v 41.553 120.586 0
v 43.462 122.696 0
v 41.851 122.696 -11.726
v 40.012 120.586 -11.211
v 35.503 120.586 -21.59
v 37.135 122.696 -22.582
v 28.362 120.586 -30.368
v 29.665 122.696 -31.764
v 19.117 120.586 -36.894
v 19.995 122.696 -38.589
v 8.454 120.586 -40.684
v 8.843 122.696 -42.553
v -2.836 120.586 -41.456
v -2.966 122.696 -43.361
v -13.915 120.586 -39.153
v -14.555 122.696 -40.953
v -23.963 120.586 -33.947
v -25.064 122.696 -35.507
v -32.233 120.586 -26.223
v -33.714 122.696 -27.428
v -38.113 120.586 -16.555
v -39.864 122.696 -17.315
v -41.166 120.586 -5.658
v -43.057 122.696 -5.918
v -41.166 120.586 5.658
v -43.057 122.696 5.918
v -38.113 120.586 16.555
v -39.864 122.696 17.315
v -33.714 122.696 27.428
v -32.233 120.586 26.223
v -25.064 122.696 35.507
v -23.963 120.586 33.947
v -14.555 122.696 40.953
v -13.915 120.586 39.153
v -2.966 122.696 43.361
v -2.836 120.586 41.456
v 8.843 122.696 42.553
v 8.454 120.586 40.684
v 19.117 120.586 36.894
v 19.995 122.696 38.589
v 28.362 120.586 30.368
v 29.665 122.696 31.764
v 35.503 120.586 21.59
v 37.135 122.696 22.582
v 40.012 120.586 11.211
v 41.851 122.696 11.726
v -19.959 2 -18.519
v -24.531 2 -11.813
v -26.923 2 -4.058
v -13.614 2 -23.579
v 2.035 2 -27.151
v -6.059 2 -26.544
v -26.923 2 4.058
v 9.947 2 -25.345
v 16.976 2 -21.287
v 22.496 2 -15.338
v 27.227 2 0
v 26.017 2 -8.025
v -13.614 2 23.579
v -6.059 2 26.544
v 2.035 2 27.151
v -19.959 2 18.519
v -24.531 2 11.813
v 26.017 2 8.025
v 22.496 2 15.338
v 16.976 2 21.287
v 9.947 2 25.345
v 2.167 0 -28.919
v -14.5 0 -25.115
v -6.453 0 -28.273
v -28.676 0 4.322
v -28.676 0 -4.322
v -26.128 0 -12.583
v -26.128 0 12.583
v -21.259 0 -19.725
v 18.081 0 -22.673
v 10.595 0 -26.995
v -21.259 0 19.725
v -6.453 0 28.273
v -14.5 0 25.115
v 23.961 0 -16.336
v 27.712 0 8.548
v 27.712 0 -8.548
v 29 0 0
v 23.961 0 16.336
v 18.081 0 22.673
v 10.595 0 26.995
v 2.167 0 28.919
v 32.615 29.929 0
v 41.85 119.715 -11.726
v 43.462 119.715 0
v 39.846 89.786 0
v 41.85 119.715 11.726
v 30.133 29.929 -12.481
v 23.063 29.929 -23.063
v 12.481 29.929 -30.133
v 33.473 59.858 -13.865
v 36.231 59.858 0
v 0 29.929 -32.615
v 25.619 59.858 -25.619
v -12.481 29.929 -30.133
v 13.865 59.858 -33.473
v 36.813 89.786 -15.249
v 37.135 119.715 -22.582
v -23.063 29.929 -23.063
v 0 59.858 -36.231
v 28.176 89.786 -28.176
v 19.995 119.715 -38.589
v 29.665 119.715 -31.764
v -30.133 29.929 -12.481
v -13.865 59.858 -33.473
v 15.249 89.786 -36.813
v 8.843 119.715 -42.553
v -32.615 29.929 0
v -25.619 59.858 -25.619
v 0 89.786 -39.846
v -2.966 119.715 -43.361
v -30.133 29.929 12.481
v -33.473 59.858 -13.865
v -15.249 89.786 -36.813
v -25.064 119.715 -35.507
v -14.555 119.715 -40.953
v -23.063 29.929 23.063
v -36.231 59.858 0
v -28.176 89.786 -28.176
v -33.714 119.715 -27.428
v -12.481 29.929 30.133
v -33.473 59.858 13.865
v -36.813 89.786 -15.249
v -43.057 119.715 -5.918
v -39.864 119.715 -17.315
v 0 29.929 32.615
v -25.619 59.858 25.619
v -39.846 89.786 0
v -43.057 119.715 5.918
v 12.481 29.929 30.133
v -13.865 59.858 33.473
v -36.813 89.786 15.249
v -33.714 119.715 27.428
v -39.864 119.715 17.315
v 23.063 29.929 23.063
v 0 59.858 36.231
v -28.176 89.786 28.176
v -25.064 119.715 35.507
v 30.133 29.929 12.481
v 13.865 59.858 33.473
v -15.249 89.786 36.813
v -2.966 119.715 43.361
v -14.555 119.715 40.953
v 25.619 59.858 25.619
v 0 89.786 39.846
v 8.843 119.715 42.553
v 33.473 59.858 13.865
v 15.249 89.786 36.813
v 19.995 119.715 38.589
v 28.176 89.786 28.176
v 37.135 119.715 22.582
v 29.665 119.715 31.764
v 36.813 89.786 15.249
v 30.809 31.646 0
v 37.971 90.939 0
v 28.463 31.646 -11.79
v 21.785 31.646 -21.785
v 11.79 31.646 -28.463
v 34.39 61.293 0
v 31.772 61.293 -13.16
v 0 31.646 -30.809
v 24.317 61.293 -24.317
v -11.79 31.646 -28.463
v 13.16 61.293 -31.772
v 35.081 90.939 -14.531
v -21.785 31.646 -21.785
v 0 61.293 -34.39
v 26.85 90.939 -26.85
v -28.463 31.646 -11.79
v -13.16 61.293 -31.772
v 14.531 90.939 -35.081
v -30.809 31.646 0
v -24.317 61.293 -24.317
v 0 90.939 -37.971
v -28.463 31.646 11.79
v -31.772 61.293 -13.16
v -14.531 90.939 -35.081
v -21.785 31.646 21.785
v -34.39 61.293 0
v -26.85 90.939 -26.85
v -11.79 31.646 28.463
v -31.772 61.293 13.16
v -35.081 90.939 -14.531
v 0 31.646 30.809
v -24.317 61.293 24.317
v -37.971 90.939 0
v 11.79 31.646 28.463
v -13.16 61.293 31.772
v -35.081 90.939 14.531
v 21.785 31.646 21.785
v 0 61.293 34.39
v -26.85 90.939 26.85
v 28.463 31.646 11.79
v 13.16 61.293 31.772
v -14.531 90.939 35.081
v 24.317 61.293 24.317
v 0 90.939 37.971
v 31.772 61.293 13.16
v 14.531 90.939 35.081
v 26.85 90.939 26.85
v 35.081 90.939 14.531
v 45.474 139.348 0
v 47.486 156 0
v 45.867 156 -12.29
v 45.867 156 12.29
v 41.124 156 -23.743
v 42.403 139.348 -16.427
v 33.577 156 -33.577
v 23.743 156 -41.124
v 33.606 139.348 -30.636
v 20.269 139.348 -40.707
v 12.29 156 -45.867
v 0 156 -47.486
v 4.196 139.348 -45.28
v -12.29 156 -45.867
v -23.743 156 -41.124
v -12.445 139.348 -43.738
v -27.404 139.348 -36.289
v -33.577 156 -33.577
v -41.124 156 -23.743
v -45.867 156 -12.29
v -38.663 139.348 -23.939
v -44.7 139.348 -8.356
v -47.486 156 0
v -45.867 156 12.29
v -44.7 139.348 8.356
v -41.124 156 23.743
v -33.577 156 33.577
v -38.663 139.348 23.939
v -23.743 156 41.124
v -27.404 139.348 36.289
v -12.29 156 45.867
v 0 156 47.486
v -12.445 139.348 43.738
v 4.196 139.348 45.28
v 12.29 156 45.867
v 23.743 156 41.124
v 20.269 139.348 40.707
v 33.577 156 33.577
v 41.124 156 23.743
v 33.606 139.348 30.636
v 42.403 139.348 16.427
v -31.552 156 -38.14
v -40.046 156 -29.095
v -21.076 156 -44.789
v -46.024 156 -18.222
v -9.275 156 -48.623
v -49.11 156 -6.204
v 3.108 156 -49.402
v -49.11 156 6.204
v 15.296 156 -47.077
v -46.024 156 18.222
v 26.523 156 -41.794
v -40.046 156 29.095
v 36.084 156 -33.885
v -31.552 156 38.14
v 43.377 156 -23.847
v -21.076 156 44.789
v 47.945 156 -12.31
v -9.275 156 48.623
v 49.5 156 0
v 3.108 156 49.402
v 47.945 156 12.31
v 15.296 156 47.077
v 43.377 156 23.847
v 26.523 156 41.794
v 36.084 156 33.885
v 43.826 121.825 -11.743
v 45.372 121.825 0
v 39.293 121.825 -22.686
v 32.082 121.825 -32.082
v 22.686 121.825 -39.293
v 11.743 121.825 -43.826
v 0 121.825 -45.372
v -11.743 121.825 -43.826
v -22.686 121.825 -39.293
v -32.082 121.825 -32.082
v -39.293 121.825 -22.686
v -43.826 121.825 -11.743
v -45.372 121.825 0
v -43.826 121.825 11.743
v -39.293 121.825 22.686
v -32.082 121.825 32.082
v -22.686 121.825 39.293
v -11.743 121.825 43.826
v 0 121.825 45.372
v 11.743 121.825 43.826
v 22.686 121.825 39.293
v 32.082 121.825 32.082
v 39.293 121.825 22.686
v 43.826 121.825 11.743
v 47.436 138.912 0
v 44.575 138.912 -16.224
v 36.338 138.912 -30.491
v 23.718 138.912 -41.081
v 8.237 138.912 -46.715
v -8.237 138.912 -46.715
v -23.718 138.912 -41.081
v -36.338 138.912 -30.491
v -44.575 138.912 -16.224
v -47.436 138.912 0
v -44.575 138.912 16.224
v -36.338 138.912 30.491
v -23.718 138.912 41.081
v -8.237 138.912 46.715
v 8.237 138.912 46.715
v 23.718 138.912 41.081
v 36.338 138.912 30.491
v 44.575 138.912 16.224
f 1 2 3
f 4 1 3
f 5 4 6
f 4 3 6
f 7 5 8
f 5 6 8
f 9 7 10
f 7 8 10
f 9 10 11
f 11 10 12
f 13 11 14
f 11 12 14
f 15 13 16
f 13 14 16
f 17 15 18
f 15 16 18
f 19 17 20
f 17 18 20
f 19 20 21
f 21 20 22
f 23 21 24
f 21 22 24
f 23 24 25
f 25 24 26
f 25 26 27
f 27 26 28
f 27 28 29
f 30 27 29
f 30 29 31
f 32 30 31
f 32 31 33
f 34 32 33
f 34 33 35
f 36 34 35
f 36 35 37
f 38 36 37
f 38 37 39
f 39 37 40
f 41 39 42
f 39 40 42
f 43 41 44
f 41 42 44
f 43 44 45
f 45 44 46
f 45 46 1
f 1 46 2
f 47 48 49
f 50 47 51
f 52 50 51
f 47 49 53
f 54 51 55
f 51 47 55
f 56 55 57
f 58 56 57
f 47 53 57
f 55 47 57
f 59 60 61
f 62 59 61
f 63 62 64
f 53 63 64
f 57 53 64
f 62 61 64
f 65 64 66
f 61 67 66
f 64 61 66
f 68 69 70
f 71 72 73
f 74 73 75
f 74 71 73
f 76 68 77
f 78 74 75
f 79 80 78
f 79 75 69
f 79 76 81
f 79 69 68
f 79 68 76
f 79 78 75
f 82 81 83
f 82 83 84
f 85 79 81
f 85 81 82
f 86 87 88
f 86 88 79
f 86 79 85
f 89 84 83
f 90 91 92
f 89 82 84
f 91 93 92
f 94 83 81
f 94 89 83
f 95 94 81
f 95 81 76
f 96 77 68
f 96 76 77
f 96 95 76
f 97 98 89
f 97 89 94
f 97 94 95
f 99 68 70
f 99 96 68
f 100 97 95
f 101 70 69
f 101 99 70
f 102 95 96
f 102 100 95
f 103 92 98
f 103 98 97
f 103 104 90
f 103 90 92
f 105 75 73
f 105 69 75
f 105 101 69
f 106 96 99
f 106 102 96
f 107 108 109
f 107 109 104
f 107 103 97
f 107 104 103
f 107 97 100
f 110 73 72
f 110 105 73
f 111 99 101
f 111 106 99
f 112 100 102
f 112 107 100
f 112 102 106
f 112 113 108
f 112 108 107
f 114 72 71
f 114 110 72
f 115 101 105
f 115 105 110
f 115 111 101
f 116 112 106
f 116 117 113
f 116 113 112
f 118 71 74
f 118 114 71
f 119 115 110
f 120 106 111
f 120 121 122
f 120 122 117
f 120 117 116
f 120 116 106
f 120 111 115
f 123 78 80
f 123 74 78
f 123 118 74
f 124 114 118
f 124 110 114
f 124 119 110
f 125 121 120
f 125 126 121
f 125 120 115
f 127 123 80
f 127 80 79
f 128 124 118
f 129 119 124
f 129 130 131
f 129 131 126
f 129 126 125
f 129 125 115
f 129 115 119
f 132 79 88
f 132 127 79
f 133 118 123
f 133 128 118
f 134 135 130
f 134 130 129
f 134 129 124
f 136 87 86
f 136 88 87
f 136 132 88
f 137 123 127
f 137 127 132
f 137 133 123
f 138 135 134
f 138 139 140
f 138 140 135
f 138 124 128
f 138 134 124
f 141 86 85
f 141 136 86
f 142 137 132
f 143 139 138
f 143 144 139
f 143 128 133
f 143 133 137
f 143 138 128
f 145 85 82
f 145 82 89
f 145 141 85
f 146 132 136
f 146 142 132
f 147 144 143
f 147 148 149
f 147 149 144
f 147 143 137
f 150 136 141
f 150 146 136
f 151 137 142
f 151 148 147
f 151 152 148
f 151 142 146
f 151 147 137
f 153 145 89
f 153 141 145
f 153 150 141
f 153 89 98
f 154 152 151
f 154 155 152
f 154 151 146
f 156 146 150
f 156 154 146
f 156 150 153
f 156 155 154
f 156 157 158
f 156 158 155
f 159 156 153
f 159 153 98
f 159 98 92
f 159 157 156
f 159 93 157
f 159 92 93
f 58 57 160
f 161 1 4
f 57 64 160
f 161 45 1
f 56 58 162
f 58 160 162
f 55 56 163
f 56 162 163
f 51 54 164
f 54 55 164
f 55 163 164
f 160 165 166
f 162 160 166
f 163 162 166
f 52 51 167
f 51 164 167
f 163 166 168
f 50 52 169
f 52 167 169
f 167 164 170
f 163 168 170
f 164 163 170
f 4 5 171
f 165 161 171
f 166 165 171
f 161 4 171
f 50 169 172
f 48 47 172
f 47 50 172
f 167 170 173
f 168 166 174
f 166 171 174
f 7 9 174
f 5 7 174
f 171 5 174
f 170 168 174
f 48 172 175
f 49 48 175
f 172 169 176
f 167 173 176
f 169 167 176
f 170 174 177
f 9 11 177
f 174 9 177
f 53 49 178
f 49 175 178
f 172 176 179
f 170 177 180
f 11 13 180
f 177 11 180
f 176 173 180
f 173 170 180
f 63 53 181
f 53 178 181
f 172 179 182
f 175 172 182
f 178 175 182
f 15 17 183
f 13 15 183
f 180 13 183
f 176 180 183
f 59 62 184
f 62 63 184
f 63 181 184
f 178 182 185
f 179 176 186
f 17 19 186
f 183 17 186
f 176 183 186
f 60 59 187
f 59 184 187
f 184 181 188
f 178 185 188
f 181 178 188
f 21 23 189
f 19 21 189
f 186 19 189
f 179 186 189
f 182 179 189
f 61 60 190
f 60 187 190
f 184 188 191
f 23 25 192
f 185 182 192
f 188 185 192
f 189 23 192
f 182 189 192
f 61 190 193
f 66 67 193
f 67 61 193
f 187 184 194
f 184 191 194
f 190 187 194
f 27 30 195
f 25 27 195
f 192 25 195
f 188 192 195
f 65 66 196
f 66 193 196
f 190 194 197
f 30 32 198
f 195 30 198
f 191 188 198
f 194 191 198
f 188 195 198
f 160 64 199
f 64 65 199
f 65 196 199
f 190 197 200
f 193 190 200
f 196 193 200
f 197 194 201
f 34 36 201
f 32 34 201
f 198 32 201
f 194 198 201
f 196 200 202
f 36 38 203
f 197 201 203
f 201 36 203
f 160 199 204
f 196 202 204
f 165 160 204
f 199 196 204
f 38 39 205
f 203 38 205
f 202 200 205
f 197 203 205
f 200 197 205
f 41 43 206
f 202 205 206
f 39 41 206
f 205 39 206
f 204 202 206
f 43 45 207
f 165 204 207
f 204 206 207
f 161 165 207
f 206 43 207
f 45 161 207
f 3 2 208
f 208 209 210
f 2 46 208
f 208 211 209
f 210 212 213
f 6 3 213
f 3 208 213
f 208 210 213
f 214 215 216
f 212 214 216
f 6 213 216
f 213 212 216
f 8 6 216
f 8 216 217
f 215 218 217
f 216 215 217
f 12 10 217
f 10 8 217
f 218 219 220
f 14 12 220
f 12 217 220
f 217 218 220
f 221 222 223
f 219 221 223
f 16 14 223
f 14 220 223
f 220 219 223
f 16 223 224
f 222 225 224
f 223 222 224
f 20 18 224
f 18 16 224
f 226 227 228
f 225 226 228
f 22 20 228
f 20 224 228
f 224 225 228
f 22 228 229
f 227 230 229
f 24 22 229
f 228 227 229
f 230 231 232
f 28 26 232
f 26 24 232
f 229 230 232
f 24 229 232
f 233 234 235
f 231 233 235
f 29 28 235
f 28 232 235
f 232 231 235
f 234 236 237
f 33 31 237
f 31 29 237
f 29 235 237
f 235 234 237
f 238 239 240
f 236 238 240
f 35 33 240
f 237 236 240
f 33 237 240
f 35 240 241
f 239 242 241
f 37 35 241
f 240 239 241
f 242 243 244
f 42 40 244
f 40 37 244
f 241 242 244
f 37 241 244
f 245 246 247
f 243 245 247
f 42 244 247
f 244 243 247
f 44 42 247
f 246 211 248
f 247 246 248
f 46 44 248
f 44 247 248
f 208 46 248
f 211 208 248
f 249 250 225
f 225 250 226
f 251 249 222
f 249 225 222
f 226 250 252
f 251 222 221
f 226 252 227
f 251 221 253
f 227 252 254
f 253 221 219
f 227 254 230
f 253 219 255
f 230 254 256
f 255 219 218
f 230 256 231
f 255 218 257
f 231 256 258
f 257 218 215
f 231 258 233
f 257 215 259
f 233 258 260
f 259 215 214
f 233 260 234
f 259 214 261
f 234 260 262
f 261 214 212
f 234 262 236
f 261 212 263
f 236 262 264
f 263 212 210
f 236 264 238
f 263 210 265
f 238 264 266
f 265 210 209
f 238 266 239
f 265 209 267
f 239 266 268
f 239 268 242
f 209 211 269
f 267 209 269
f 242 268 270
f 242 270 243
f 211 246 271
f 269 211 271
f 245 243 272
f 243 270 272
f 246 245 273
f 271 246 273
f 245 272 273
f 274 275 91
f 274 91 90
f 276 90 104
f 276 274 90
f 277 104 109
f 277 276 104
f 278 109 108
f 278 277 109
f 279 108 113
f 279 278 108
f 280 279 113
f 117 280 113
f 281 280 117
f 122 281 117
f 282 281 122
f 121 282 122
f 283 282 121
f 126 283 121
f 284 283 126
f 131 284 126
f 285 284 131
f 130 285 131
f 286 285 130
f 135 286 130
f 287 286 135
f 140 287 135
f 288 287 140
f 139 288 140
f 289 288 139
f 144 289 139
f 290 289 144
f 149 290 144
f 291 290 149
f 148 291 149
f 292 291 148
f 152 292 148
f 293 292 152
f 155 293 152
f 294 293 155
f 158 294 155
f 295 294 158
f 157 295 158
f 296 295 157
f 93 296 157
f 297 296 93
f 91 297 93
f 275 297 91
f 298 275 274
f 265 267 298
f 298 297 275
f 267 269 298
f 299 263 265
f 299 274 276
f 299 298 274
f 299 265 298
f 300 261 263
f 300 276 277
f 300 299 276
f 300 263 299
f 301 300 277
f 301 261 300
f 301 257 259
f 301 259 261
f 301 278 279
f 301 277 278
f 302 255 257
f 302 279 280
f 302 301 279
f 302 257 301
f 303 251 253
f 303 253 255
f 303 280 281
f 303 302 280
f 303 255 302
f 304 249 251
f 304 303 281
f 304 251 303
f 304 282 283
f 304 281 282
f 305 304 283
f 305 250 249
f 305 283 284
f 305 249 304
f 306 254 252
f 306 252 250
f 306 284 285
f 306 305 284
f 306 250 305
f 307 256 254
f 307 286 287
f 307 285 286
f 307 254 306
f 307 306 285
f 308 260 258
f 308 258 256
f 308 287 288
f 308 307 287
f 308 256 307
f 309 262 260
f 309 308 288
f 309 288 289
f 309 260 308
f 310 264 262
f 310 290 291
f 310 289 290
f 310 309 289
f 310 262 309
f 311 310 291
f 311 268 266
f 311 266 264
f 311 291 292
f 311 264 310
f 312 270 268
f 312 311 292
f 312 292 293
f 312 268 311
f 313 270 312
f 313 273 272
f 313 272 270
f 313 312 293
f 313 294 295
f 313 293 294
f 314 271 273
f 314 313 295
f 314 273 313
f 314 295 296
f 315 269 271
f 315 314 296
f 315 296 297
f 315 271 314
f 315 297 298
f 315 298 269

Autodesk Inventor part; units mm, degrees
ref_plane "YZ Plane" through (0, 0, 0) normal (1, 0, 0) x (0, 1, 0)
ref_plane "XZ Plane" through (0, 0, 0) normal (0, 1, 0) x (-1, 0, 0)
ref_plane "XY Plane" through (0, 0, 0) normal (0, 0, 1) x (1, 0, 0)
sketch "Sketch1" plane through (0, 0, 0) normal (0, 0, 1) x (1, 0, 0)
  line L0 (0, 0) -> (29, 0)
  line L1 (29, 0) -> (43.462, 119.715)
  line L2 (43.462, 119.715) -> (45.3715, 121.8246)
  line L3 (45.3715, 121.8246) -> (49.5, 156)
  line L4 (49.5, 156) -> (0, 156) construction
  line L5 (0, 156) -> (0, 0) construction
  line L6 (0, 0) -> (0, 2)
  line L7 (0, 2) -> (27.2271, 2)
  line L8 (27.2271, 2) -> (41.5527, 120.5859)
  line L9 (41.5527, 120.5859) -> (43.4622, 122.6955)
  line L10 (43.4622, 122.6955) -> (47.4855, 156)
  line L11 (49.5, 156) -> (47.4855, 156)
  dimension "d1" = 29
  dimension "d2" = 49.5
  dimension "d3" = 156
  dimension "d24" = 2
  dimension "d25" = 2
  dimension "d26" = 2
  dimension "d27" = 2
revolve "Revolution1" add sketch "Sketch1" angle 360 about axis through (0, 156, 0) along (0, -1, 0)
equation "\"d24\" = PopcornCup_Thickness"
equation "\"d25\" = PopcornCup_Thickness"
equation "\"d26\" = PopcornCup_Thickness"
equation "\"d27\" = PopcornCup_Thickness"
equation "\"PopcornCup_Thickness\" = 2"
equation "\"PopcornCup_Base_DiameterMax\" = 58"
properties part number "PopcornCup" material "Polycarbonate, Clear"
